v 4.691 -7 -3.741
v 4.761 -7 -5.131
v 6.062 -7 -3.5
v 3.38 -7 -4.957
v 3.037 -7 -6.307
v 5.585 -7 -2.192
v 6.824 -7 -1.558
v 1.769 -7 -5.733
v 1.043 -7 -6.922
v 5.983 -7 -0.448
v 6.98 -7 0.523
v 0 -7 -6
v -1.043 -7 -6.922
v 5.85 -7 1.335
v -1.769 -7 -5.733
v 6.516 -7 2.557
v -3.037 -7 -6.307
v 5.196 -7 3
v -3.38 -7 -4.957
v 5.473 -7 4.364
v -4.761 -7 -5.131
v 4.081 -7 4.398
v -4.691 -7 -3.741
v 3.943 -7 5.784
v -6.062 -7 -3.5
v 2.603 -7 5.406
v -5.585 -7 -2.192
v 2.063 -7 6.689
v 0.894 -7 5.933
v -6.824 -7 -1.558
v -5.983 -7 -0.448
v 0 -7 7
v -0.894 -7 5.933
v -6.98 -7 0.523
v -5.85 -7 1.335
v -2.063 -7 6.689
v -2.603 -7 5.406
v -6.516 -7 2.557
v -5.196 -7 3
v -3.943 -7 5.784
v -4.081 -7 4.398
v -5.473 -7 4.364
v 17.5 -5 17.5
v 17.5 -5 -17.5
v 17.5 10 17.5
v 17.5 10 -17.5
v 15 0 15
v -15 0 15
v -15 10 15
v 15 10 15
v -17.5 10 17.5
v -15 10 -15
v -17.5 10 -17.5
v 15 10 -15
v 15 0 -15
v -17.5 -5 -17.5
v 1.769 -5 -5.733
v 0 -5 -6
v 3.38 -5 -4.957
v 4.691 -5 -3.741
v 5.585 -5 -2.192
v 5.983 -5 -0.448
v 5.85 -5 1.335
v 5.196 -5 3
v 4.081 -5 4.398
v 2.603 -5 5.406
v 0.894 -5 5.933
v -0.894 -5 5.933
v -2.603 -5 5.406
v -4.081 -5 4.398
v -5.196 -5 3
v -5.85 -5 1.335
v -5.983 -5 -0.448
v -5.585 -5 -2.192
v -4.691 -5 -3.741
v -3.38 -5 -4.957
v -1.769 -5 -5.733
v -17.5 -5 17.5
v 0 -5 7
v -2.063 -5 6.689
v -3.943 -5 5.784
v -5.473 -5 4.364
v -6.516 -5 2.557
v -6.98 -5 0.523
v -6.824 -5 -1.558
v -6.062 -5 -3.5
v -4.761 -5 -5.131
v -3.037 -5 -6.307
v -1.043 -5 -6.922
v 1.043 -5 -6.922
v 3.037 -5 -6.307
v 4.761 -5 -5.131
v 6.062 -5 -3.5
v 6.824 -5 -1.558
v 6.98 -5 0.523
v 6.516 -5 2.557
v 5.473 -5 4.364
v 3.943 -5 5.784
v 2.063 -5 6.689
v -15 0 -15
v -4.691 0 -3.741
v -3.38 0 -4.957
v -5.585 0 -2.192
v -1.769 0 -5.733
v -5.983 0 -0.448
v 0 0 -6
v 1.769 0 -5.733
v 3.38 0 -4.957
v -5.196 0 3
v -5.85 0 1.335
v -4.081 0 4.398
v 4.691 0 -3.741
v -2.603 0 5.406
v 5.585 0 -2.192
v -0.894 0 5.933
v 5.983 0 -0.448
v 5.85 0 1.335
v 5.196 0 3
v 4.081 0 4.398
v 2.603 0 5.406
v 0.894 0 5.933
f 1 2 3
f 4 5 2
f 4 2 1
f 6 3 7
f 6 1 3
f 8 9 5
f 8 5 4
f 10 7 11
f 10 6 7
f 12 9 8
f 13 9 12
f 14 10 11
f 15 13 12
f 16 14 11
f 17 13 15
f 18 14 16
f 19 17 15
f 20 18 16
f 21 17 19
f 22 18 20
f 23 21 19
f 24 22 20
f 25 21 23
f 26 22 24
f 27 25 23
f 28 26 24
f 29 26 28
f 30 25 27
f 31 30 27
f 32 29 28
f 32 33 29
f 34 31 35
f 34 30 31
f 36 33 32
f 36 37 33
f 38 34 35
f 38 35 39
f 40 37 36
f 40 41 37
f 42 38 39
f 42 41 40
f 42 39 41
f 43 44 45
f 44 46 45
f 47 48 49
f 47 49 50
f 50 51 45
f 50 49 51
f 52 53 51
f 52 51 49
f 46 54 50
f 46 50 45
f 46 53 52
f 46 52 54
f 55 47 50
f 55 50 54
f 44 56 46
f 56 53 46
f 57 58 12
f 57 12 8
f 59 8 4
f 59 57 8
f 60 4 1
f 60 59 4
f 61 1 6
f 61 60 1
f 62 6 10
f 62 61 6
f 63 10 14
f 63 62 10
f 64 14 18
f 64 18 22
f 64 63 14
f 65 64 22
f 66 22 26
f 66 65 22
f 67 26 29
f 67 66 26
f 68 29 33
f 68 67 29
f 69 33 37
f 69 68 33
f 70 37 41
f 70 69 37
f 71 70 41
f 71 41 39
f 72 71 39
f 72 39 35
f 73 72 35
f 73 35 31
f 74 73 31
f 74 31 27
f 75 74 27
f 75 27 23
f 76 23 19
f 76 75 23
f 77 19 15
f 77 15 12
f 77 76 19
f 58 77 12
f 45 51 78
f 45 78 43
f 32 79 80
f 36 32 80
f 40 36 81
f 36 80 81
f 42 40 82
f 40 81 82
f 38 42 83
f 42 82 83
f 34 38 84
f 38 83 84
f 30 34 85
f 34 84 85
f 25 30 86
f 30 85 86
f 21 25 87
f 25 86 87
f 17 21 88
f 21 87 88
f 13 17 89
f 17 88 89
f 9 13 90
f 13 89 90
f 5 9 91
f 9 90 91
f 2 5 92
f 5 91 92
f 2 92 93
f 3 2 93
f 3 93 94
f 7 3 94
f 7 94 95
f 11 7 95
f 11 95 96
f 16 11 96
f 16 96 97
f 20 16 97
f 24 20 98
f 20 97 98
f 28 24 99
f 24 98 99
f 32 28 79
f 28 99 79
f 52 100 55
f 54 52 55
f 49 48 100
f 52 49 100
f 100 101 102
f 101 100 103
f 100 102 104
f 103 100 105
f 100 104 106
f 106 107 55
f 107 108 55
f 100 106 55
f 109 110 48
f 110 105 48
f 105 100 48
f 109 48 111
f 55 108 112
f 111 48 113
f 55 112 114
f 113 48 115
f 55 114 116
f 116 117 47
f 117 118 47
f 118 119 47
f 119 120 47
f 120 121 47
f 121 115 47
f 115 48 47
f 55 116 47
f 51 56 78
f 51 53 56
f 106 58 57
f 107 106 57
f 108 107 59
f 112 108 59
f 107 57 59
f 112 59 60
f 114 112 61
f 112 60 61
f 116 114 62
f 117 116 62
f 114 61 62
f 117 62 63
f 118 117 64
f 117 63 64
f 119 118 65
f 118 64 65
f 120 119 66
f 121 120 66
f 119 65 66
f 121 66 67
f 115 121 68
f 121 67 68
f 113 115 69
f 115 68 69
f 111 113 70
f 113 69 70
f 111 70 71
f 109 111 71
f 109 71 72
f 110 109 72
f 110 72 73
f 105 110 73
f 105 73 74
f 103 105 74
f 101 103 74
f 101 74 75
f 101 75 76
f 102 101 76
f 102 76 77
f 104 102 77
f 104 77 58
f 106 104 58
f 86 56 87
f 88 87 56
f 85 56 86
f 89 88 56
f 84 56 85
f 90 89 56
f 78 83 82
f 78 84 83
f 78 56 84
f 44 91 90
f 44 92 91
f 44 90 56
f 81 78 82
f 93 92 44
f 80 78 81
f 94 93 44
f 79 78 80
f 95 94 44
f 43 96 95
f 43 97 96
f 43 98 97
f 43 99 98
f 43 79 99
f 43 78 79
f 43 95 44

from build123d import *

# Parameters (mm, degrees)
SKETCH1_W           = 35
SKETCH1_H           = 35
SKETCH1_W_2         = 30
SKETCH1_H_2         = 30
BOSS_EXTRUDE1_DEPTH = 10
SKETCH4_W           = 35
SKETCH4_H           = 35
BOSS_EXTRUDE2_DEPTH = 5
SKETCH5_R           = 6
CUT_EXTRUDE1_DEPTH  = 29.939592257
SKETCH6_R           = 7
SKETCH6_R_2         = 6
BOSS_EXTRUDE3_DEPTH = 2


with BuildPart() as part:
    # Sketch1 → Boss-Extrude1 (new body)
    with BuildSketch(Plane(origin=(0, 0, 0), x_dir=(1, 0, 0), z_dir=(0, 1, 0))):
        Rectangle(SKETCH1_W, SKETCH1_H)
        Rectangle(SKETCH1_W_2, SKETCH1_H_2, mode=Mode.SUBTRACT)
    extrude(amount=BOSS_EXTRUDE1_DEPTH)

    # Sketch4 → Boss-Extrude2 (add)
    with BuildSketch(Plane.XZ):
        Rectangle(SKETCH4_W, SKETCH4_H)
    extrude(amount=BOSS_EXTRUDE2_DEPTH)

    # Sketch5 → Cut-Extrude1 (cut, through all)
    with BuildSketch(Plane.XZ.offset(5)):
        with Locations(Location((0, 0, 0), (0, 0, 270))):
            Circle(SKETCH5_R)
    extrude(amount=-CUT_EXTRUDE1_DEPTH, mode=Mode.SUBTRACT)

    # Sketch6 → Boss-Extrude3 (add)
    with BuildSketch(Plane(origin=(0, -5, 0), x_dir=(-1, 0, 0), z_dir=(0, -1, 0))):
        with Locations(Location((0, 0, 0), (0, 0, 270))):
            Circle(SKETCH6_R)
        with Locations(Location((0, 0, 0), (0, 0, 90))):
            Circle(SKETCH6_R_2, mode=Mode.SUBTRACT)
    extrude(amount=BOSS_EXTRUDE3_DEPTH)


solid = part.part
